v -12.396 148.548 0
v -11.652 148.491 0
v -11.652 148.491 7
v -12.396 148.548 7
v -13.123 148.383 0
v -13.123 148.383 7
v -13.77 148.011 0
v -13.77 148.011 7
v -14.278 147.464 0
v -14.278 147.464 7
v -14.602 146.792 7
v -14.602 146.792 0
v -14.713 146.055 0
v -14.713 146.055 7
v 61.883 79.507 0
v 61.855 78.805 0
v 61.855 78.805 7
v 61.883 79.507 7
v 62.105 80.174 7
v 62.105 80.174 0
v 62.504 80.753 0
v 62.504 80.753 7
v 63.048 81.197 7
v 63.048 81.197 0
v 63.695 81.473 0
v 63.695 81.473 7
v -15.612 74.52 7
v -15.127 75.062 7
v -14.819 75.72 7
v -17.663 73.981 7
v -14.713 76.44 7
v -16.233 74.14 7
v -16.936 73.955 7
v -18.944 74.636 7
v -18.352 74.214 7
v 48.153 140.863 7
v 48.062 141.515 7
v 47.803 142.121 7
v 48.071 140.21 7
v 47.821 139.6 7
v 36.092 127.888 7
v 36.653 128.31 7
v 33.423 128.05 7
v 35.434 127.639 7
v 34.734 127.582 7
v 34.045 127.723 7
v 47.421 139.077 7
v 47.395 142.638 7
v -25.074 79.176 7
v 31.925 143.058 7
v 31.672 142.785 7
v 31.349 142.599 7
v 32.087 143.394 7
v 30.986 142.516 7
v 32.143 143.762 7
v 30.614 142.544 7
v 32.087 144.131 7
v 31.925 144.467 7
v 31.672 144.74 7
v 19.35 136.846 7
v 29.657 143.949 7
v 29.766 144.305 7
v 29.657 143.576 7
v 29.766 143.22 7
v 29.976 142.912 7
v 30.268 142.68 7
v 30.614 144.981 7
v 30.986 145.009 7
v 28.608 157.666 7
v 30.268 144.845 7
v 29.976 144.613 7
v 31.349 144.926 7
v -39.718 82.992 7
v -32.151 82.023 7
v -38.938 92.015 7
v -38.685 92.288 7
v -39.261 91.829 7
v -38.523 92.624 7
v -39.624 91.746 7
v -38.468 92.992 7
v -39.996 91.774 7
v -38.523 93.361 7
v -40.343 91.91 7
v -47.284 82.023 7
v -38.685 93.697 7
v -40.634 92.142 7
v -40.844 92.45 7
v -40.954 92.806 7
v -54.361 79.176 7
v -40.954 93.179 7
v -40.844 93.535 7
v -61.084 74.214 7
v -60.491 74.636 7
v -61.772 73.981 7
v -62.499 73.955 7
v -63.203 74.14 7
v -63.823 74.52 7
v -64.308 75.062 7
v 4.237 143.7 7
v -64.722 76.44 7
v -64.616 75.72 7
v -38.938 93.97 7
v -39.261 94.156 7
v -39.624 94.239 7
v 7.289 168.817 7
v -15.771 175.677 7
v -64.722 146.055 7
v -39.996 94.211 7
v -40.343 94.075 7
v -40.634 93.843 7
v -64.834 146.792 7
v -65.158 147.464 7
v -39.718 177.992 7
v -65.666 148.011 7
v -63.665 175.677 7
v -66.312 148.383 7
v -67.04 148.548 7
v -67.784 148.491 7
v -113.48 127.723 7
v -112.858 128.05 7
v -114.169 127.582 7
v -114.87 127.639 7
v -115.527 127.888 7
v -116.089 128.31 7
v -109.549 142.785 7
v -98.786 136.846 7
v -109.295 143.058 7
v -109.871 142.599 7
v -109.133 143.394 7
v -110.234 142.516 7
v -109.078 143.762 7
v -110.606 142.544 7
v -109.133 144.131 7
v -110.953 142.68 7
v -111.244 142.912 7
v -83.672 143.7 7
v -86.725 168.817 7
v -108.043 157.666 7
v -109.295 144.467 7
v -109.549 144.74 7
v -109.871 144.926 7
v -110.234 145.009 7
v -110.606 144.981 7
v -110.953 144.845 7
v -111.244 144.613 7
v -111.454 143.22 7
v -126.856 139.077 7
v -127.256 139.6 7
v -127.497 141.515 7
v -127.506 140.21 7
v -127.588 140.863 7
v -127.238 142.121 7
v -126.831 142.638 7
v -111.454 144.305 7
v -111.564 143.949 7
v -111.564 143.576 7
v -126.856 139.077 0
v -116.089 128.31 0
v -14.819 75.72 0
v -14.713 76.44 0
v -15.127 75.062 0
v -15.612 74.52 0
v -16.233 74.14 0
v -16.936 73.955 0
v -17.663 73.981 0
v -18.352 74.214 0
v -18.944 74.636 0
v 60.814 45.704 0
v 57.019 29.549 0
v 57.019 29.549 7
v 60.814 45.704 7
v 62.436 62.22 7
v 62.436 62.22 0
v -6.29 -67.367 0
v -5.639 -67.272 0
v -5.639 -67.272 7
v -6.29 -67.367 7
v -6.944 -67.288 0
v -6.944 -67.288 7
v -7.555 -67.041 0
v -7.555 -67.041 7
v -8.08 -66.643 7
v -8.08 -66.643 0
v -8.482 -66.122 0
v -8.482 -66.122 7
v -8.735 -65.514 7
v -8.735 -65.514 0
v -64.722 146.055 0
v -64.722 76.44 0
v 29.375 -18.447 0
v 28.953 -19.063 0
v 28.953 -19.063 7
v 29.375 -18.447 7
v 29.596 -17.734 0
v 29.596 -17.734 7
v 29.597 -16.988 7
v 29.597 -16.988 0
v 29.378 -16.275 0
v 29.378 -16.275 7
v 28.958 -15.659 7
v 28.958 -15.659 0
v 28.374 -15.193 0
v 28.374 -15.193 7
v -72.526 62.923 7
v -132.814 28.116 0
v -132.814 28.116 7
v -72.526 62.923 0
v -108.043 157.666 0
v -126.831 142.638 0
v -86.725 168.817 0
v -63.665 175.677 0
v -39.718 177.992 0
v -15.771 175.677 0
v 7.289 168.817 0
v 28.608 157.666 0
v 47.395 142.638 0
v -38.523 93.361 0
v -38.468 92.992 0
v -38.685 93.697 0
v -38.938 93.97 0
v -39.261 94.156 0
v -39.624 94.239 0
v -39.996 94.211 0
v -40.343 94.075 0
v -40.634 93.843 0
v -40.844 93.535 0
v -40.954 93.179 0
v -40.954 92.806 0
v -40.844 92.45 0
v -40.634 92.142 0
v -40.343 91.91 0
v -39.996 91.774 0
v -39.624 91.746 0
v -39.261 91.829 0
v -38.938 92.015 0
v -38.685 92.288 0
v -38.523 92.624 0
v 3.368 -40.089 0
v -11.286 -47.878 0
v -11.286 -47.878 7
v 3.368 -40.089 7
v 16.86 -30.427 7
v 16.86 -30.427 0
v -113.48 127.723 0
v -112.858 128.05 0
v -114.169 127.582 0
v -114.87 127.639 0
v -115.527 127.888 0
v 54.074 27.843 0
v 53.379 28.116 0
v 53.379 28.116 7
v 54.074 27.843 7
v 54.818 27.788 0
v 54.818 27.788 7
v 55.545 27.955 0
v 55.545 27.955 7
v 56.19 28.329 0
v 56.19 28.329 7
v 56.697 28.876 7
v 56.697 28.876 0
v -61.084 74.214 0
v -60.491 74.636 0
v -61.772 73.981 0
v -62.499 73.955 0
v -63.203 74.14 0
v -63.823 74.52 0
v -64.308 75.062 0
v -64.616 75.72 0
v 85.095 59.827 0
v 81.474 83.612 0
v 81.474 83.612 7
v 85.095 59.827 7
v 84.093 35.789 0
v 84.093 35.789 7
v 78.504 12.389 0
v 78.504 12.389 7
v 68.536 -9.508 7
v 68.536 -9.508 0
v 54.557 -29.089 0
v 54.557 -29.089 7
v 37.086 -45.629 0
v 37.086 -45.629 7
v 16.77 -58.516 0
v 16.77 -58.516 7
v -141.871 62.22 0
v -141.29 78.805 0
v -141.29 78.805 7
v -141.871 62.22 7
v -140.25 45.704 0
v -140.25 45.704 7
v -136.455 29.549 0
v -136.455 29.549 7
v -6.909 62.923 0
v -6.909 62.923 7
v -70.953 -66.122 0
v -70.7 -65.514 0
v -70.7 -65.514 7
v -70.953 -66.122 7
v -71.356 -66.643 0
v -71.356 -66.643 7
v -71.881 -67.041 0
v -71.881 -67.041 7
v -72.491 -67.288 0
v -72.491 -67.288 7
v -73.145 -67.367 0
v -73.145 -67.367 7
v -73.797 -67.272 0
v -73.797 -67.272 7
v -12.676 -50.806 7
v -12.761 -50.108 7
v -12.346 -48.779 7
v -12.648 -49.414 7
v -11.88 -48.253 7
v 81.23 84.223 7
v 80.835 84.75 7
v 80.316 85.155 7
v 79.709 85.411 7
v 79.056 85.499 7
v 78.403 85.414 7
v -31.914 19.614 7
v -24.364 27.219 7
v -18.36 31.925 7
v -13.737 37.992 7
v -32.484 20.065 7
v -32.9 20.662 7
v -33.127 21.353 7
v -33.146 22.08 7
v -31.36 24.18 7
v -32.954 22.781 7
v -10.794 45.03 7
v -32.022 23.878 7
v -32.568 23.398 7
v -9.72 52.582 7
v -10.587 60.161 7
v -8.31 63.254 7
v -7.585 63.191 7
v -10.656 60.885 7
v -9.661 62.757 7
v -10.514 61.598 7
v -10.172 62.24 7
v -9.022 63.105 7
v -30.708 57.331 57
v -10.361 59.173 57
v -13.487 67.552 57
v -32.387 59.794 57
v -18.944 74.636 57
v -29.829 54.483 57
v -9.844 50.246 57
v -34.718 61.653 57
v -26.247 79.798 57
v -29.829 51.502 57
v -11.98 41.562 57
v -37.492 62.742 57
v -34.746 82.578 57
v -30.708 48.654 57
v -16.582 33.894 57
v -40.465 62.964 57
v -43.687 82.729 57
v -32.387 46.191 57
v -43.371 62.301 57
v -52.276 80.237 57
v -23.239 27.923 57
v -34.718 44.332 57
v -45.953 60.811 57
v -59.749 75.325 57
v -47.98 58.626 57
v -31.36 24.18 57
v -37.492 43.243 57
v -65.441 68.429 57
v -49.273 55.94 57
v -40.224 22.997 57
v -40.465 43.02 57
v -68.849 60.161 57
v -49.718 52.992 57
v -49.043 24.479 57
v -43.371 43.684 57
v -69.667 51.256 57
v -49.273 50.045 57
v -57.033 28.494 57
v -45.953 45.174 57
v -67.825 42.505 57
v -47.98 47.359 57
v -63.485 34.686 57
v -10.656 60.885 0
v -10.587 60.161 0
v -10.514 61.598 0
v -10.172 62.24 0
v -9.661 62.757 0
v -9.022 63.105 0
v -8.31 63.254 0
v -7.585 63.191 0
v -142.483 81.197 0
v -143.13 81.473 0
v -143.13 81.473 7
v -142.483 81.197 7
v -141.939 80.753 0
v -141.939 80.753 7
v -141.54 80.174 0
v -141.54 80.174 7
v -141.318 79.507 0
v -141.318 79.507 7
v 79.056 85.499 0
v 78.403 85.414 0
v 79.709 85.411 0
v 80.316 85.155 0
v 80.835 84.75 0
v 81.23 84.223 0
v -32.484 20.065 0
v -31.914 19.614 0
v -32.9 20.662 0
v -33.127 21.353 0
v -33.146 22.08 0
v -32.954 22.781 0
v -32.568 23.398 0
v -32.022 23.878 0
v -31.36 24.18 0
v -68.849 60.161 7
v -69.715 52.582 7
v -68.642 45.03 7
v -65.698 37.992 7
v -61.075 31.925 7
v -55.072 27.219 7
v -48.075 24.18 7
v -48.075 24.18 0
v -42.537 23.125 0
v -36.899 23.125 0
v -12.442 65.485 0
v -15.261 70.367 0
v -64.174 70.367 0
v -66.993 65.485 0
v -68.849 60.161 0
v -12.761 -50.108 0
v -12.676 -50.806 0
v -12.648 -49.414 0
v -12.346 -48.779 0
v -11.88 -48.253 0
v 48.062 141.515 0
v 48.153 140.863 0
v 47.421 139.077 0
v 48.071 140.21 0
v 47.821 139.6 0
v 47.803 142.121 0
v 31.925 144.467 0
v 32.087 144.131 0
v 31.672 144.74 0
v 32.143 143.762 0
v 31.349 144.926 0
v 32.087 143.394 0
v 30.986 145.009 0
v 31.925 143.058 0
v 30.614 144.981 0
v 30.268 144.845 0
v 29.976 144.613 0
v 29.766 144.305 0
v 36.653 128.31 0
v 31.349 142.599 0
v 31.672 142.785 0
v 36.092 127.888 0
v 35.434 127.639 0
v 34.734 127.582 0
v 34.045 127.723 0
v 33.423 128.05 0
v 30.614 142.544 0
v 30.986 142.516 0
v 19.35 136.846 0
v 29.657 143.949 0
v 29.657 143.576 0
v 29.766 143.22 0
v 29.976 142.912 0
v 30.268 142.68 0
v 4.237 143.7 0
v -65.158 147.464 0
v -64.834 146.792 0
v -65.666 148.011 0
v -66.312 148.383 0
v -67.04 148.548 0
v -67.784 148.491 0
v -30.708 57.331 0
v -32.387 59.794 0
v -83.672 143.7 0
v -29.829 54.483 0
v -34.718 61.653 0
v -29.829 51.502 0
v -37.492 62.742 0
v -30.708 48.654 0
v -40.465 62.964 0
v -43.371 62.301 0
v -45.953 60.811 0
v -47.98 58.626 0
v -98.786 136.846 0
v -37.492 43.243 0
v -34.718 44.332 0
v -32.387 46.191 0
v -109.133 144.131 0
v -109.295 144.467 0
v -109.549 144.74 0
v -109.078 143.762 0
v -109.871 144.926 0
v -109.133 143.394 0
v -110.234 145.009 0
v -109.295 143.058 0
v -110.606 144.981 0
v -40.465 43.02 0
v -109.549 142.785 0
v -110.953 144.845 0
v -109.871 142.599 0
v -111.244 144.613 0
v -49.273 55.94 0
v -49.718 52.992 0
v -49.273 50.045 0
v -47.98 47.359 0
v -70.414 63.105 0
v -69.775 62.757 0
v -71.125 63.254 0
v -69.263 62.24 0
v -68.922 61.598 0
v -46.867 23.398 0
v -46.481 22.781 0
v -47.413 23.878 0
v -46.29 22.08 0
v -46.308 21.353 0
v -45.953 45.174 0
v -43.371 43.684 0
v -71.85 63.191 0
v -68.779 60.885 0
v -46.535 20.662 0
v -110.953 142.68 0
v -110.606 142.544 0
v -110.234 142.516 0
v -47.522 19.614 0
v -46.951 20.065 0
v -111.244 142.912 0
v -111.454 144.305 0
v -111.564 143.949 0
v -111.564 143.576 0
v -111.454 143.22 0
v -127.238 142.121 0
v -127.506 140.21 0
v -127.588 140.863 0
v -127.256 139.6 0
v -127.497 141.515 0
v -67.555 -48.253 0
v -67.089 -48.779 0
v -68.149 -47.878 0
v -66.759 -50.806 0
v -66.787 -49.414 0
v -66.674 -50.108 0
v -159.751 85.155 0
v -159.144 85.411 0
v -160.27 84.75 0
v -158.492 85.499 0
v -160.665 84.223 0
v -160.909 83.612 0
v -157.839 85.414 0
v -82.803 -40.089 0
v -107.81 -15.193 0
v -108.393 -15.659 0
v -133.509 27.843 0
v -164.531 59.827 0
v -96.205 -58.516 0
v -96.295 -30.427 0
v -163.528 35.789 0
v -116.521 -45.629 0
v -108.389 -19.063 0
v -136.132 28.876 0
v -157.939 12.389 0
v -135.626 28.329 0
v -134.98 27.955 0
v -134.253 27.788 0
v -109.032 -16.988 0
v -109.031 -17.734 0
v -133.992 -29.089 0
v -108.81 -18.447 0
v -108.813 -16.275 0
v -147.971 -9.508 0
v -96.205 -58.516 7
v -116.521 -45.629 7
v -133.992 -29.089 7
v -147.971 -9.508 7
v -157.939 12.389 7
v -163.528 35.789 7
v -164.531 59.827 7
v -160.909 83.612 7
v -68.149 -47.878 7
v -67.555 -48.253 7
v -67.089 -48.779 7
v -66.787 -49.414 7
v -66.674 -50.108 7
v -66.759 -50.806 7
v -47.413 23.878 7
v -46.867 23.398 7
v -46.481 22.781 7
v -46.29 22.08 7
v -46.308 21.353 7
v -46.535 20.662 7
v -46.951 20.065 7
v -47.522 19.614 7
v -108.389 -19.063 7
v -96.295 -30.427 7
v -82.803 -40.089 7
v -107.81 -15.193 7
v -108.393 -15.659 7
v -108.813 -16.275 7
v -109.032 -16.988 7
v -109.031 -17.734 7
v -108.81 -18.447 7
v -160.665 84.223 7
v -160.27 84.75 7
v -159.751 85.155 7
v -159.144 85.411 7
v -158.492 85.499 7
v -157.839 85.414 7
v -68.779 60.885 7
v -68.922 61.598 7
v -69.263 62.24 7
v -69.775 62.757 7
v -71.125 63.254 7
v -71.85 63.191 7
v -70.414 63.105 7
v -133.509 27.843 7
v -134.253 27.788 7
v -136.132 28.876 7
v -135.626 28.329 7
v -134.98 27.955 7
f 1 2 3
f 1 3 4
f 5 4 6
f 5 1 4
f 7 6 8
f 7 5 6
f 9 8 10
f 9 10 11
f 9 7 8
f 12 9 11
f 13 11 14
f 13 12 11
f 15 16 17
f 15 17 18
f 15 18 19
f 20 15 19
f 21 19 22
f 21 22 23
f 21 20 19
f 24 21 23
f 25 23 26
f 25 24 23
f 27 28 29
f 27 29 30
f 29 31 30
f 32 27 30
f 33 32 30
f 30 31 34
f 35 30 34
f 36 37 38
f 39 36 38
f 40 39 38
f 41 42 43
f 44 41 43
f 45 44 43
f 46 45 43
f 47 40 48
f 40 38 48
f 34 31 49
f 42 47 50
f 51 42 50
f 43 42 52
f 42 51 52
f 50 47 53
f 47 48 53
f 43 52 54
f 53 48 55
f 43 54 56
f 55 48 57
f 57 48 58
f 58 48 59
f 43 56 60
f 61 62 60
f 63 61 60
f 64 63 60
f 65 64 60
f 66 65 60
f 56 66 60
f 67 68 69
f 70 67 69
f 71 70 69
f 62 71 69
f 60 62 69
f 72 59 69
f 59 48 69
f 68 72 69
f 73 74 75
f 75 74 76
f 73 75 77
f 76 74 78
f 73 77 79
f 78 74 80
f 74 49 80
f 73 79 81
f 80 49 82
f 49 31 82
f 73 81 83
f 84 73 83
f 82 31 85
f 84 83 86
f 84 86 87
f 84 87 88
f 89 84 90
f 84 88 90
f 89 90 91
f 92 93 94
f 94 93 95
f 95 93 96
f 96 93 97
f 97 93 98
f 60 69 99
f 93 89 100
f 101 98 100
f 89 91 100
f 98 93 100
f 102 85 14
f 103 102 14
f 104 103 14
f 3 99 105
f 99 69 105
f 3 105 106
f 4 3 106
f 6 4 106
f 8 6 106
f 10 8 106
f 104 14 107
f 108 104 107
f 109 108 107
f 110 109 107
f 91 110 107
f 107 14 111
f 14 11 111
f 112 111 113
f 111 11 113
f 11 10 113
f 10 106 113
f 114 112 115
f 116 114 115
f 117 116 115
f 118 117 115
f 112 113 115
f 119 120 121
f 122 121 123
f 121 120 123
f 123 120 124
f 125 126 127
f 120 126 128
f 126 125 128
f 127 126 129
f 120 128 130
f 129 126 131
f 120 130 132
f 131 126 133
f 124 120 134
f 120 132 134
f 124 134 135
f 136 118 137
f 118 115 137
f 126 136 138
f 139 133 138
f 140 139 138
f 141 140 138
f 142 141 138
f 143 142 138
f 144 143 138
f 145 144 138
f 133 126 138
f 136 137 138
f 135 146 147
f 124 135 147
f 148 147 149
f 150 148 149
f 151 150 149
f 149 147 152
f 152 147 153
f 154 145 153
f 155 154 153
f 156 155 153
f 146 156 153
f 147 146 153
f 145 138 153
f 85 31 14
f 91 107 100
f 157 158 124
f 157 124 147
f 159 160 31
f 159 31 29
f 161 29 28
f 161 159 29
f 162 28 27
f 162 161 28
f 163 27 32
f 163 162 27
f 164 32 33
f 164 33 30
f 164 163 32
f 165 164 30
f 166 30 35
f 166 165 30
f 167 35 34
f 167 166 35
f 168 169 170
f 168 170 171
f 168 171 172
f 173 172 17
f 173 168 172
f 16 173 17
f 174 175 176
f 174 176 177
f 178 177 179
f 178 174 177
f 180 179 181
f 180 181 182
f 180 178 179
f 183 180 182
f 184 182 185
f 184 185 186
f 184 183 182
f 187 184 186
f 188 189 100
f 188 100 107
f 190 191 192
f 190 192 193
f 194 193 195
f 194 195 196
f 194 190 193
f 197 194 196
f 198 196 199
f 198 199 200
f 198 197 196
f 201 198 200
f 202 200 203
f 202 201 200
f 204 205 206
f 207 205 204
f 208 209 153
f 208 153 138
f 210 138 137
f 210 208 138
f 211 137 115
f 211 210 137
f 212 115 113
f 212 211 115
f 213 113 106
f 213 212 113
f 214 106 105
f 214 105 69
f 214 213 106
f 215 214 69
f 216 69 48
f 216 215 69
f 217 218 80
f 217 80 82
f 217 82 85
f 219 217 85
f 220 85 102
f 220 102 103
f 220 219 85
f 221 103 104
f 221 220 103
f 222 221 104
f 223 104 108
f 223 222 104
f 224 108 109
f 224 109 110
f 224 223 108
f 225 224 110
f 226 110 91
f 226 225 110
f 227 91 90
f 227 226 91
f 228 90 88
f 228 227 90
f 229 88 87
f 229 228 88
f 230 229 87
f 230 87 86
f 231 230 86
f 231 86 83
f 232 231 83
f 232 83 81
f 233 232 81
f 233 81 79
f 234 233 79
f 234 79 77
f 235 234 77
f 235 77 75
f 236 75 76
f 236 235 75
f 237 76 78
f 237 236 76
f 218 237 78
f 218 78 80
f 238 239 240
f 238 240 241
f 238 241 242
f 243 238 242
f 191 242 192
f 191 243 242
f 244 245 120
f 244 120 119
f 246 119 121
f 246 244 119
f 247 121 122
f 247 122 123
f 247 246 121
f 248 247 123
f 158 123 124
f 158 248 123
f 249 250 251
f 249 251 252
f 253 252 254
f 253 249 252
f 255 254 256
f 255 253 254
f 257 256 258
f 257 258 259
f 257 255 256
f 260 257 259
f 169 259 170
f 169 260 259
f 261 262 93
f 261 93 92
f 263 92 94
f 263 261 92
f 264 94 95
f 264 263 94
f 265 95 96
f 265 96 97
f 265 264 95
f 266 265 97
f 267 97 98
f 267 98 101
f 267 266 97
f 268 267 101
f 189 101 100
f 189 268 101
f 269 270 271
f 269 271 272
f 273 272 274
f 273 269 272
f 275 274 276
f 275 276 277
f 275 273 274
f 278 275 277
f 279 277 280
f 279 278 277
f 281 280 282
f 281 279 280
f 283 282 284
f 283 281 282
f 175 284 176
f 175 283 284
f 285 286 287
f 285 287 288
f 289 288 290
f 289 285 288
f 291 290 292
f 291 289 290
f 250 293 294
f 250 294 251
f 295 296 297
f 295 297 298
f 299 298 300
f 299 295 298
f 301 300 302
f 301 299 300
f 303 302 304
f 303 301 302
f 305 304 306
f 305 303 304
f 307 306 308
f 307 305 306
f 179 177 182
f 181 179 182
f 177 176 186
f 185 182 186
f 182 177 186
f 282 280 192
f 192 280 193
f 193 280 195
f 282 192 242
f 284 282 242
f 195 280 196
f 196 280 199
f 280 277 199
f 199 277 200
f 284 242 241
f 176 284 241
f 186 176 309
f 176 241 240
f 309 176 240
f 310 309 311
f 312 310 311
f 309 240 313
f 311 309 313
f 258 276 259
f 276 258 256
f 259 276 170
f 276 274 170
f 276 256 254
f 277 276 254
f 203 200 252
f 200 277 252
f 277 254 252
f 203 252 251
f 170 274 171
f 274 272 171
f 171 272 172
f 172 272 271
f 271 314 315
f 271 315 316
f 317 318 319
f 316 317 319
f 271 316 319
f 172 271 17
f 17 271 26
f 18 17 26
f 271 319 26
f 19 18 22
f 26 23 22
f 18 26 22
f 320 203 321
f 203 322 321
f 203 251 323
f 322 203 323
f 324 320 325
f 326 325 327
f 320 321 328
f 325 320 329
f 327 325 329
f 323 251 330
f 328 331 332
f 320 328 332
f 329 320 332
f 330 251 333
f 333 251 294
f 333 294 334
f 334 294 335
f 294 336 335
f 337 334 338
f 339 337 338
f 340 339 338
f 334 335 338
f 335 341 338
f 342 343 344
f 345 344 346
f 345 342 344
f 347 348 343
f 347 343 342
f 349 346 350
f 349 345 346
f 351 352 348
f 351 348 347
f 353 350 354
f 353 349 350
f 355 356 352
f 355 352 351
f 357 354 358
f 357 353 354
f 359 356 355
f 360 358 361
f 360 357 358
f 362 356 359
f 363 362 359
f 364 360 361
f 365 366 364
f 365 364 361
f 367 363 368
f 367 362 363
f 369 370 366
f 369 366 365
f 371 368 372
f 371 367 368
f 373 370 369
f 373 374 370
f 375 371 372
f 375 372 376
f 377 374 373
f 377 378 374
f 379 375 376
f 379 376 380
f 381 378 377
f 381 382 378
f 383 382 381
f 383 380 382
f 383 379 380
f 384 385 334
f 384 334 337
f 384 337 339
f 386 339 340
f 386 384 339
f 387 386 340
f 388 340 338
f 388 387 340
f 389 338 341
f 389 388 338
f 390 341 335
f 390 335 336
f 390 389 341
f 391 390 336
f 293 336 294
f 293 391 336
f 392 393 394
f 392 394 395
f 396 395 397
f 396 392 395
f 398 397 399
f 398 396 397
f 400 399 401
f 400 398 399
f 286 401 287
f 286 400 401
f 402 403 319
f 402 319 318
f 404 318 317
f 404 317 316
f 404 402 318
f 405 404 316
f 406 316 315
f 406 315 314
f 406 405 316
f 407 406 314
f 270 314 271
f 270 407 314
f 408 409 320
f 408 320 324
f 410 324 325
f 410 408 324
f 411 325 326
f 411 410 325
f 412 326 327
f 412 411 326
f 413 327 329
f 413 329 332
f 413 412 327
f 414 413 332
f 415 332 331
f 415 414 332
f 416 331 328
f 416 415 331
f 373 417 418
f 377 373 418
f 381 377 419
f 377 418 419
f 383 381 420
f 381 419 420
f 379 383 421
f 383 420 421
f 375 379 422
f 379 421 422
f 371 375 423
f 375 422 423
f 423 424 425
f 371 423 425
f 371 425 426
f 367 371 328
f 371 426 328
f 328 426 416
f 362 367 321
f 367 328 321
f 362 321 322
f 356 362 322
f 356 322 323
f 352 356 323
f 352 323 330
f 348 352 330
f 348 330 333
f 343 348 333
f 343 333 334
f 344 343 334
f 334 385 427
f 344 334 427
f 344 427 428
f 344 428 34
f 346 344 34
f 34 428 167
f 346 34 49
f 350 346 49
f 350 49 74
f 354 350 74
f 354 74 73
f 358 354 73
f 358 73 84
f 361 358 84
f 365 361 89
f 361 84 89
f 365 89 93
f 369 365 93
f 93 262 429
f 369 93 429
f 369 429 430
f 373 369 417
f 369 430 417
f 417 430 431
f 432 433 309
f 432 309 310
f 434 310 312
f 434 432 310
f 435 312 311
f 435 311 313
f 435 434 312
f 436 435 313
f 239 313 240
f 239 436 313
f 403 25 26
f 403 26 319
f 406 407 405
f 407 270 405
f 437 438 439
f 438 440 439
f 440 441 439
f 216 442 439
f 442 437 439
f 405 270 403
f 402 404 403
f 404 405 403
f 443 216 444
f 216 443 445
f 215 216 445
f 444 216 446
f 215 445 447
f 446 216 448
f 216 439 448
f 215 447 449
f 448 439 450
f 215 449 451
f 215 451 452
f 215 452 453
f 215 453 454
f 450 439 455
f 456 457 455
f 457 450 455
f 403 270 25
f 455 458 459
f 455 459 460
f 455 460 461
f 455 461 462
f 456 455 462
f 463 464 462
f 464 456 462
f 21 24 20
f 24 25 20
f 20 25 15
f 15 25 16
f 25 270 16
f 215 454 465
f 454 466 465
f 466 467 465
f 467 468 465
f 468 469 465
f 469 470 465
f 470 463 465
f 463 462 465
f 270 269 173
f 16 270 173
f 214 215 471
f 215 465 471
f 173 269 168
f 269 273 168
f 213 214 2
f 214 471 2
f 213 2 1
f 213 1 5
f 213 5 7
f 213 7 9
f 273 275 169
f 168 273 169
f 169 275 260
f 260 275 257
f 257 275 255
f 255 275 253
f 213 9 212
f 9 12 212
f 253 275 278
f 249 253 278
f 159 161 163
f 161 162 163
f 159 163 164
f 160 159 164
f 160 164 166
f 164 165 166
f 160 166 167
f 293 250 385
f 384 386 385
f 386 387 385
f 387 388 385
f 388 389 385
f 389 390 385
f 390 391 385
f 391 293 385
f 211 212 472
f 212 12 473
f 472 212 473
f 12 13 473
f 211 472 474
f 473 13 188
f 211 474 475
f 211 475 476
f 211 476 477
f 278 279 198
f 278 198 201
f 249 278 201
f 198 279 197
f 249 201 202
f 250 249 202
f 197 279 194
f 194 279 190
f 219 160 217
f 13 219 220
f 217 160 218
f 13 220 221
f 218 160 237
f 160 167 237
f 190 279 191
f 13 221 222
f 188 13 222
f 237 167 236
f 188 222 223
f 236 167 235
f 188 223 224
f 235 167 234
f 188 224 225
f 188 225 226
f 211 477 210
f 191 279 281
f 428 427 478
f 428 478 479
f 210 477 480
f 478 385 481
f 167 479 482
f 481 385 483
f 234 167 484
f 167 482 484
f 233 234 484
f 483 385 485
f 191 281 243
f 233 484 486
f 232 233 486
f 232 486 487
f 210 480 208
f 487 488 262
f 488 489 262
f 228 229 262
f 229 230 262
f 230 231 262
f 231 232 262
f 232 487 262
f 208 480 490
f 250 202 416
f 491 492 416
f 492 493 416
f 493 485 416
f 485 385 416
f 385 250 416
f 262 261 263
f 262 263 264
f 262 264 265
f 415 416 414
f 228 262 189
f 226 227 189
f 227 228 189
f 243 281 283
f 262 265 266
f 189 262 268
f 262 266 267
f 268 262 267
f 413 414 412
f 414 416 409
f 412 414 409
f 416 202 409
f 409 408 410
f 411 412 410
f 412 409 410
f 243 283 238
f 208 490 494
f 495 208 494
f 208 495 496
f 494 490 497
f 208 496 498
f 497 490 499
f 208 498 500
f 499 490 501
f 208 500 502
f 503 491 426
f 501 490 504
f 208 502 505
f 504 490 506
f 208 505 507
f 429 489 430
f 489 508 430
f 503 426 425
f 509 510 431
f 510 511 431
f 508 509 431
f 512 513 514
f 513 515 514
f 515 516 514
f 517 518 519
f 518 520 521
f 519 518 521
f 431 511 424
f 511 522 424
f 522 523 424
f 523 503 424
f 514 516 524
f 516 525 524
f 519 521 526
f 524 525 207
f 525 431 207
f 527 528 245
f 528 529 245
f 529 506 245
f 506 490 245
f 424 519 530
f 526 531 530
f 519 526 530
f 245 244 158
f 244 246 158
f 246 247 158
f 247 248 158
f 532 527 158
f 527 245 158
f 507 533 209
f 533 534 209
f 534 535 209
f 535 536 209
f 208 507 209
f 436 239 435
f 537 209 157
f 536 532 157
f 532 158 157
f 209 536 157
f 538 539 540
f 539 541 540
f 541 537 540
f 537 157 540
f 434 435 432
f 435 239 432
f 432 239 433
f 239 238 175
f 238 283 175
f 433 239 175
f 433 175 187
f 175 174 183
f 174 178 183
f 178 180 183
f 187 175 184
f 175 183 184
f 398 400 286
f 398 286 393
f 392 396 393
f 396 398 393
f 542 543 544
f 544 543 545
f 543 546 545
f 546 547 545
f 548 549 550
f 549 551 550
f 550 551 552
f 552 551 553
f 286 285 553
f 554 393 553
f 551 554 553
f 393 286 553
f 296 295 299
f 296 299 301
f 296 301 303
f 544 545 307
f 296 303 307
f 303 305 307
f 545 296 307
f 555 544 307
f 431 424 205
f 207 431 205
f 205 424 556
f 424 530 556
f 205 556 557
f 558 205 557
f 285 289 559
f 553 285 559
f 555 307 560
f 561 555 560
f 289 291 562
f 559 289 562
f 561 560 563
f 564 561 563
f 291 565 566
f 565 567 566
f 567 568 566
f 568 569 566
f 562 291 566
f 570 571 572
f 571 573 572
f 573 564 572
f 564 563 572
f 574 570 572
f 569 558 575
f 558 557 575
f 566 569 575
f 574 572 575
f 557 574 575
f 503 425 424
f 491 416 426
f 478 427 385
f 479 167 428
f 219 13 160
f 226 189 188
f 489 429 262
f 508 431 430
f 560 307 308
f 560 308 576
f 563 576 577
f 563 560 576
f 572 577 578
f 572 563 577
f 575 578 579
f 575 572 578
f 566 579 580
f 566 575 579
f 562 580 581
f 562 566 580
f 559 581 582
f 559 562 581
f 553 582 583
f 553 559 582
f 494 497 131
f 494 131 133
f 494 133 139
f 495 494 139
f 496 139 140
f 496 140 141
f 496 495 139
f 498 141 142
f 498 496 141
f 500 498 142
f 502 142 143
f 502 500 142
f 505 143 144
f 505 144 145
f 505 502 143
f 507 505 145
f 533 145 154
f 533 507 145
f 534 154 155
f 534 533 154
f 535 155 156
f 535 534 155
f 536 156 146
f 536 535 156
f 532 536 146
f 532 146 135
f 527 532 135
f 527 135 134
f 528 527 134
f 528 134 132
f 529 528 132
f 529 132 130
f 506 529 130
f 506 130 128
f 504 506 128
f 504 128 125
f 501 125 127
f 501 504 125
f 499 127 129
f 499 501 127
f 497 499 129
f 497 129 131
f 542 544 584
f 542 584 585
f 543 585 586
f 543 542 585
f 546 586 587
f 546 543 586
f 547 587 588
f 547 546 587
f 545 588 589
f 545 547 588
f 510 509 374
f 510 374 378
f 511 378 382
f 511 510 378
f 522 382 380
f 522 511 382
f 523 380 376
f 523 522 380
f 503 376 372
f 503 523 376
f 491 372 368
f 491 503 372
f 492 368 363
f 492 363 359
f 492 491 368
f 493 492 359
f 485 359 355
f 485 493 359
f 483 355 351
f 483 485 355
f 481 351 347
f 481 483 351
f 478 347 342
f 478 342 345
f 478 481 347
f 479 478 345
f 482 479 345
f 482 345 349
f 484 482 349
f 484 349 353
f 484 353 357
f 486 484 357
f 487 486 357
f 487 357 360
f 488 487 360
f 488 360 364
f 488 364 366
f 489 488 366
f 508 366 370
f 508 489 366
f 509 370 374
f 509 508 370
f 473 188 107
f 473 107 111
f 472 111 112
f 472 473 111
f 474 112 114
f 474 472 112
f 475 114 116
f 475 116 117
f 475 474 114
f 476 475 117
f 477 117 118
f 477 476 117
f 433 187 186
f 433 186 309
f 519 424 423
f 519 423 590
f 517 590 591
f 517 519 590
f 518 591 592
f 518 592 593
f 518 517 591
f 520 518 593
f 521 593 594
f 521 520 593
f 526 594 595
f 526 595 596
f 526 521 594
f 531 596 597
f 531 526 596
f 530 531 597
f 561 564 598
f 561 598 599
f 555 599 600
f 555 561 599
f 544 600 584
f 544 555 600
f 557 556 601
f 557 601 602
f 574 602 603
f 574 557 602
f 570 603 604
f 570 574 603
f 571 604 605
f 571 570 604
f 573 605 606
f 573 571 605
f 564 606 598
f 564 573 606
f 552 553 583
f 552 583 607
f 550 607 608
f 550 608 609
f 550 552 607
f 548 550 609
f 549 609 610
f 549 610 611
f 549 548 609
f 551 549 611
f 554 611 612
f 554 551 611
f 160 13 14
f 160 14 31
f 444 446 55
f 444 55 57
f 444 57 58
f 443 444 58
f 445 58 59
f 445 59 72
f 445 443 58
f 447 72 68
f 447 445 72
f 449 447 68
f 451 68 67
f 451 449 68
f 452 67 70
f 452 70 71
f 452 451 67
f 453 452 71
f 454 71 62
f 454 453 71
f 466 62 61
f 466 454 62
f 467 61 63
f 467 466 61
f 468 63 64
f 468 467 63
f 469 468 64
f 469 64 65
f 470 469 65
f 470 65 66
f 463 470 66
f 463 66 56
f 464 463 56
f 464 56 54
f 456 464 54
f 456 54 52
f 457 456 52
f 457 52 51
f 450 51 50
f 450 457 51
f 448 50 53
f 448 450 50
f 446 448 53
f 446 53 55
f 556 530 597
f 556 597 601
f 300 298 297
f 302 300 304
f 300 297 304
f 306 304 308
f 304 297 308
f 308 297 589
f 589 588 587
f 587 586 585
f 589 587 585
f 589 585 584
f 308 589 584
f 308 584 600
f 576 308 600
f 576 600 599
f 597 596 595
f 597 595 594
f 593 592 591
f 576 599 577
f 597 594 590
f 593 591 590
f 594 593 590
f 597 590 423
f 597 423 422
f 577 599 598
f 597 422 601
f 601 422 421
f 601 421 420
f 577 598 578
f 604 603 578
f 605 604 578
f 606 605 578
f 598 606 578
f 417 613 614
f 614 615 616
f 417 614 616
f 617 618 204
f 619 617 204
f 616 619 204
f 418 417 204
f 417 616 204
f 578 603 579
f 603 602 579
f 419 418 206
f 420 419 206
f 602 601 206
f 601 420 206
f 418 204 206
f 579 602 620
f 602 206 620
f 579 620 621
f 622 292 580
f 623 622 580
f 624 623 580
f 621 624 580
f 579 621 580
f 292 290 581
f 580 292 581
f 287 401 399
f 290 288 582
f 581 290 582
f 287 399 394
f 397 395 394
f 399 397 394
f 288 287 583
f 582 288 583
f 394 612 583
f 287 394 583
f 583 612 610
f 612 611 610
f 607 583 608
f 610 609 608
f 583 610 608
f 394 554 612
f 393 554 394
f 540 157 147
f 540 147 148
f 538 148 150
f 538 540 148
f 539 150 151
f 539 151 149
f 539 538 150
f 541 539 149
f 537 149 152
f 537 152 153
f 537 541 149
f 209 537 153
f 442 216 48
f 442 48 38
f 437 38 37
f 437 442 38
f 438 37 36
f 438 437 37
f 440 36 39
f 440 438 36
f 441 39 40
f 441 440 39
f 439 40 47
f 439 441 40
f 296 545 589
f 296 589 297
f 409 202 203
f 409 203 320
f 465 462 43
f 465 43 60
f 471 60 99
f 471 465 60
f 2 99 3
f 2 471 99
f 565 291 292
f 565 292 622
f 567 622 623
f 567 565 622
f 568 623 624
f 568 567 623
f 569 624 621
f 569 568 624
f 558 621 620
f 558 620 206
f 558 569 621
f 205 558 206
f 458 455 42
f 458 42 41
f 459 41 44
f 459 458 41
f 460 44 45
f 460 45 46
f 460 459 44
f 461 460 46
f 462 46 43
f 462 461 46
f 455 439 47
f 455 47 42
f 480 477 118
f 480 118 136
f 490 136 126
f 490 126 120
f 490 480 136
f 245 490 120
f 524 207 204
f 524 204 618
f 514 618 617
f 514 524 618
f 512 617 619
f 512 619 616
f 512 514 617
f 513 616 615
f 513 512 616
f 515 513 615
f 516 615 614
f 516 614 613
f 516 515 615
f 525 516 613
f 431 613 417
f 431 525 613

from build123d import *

# Parameters (mm, degrees)
SKETCH1_R             = 1.25
BOSS_EXTRUDE1_DEPTH   = 7
BOSS_EXTRUDE2_DEPTH   = 7
BOSS_EXTRUDE2_2_DEPTH = 7
SKETCH1_7_R           = 10
BOSS_EXTRUDE3_DEPTH   = 57


with BuildPart() as part:
    # Sketch1 → Boss-Extrude1 (new body)
    with BuildSketch(Plane.XY):
        with BuildLine():
            ThreePointArc((-60.491152811, 74.636373352), (-39.71763232, 82.992417004), (-18.944111829, 74.636373352))
            ThreePointArc((-18.944111829, 74.636373352), (-16.23263232, 74.140273701), (-14.712985122, 76.440036381))
            Line((-14.712985122, 76.440036381), (-14.712985122, 146.054710198))
            ThreePointArc((-14.712985122, 146.054710198), (-13.769696668, 148.010892491), (-11.651665791, 148.490879447))
            ThreePointArc((-11.651665791, 148.490879447), (11.907367753, 140.523795103), (33.422869053, 128.050395473))
            ThreePointArc((33.422869053, 128.050395473), (35.085920842, 127.585787298), (36.653446033, 128.309988089))
            Line((36.653446033, 128.309988089), (47.420811552, 139.077353608))
            ThreePointArc((47.420811552, 139.077353608), (48.15298045, 140.863029774), (47.395303312, 142.638032879))
            ThreePointArc((47.395303312, 142.638032879), (-39.71763232, 177.992417004), (-126.830567952, 142.638032879))
            ThreePointArc((-126.830567952, 142.638032879), (-127.588245091, 140.863029774), (-126.856076193, 139.077353608))
            Line((-126.856076193, 139.077353608), (-116.088710674, 128.309988089))
            ThreePointArc((-116.088710674, 128.309988089), (-114.521185483, 127.585787298), (-112.858133693, 128.050395473))
            ThreePointArc((-112.858133693, 128.050395473), (-91.342632394, 140.523795103), (-67.783598849, 148.490879447))
            ThreePointArc((-67.783598849, 148.490879447), (-65.665567973, 148.010892491), (-64.722279519, 146.054710198))
            Line((-64.722279519, 146.054710198), (-64.722279519, 76.440036381))
            ThreePointArc((-64.722279519, 76.440036381), (-63.20263232, 74.140273701), (-60.491152811, 74.636373352))
        make_face()
        with Locations((-39.71763232, 92.992417004)):
            Circle(SKETCH1_R, mode=Mode.SUBTRACT)
        with Locations((-110.327911654, 143.762392505)):
            Circle(SKETCH1_R, mode=Mode.SUBTRACT)
        with Locations((30.892647013, 143.762392505)):
            Circle(SKETCH1_R, mode=Mode.SUBTRACT)
    extrude(amount=BOSS_EXTRUDE1_DEPTH)



with BuildPart() as body_2:
    # Sketch1<5> → Boss-Extrude2 (new body)
    with BuildSketch(Plane.XY):
        with BuildLine():
            Line((-31.91372188, 19.613947629), (28.374354121, -15.19338928))
            ThreePointArc((28.374354121, -15.19338928), (29.596813454, -16.988392191), (28.953478913, -19.062654214))
            ThreePointArc((28.953478913, -19.062654214), (10.274264705, -35.481833579), (-11.285766896, -47.878104465))
            ThreePointArc((-11.285766896, -47.878104465), (-12.519655272, -49.086045475), (-12.676241586, -50.805662507))
            Line((-12.676241586, -50.805662507), (-8.735112274, -65.514157338))
            ThreePointArc((-8.735112274, -65.514157338), (-7.5547558, -67.041072287), (-5.638719451, -67.272406189))
            ThreePointArc((-5.638719451, -67.272406189), (68.535543153, -9.507582996), (81.474216181, 83.611624322))
            ThreePointArc((81.474216181, 83.611624322), (80.31585697, 85.155293524), (78.403331598, 85.414054741))
            Line((78.403331598, 85.414054741), (63.694836768, 81.47292543))
            ThreePointArc((63.694836768, 81.47292543), (62.28389789, 80.477509189), (61.854734477, 78.804960004))
            ThreePointArc((61.854734477, 78.804960004), (61.899264778, 53.935289488), (57.019445442, 29.549025778))
            ThreePointArc((57.019445442, 29.549025778), (55.544749107, 27.954750711), (53.37900132, 28.115930093))
            Line((53.37900132, 28.115930093), (-6.909074682, 62.923267002))
            ThreePointArc((-6.909074682, 62.923267002), (-9.660551185, 62.757095263), (-10.586656039, 60.160835301))
            ThreePointArc((-10.586656039, 60.160835301), (-13.736870207, 37.992417004), (-31.360176529, 24.180042358))
            ThreePointArc((-31.360176529, 24.180042358), (-33.145551185, 22.079882047), (-31.91372188, 19.613947629))
        make_face()
    extrude(amount=BOSS_EXTRUDE2_DEPTH)


with BuildPart() as body_3:
    # Sketch1<5> → Boss-Extrude2 2 (new body)
    with BuildSketch(Plane.XY):
        with BuildLine():
            ThreePointArc((-47.52154276, 19.613947629), (-46.289713456, 22.079882047), (-48.075088111, 24.180042358))
            ThreePointArc((-48.075088111, 24.180042358), (-65.698394434, 37.992417004), (-68.848608602, 60.160835301))
            ThreePointArc((-68.848608602, 60.160835301), (-69.774713456, 62.757095263), (-72.526189959, 62.923267002))
            Line((-72.526189959, 62.923267002), (-132.81426596, 28.115930093))
            ThreePointArc((-132.81426596, 28.115930093), (-134.980013747, 27.954750711), (-136.454710083, 29.549025778))
            ThreePointArc((-136.454710083, 29.549025778), (-141.334529419, 53.935289488), (-141.289999118, 78.804960004))
            ThreePointArc((-141.289999118, 78.804960004), (-141.71916253, 80.477509189), (-143.130101408, 81.47292543))
            Line((-143.130101408, 81.47292543), (-157.838596239, 85.414054741))
            ThreePointArc((-157.838596239, 85.414054741), (-159.751121611, 85.155293524), (-160.909480822, 83.611624322))
            ThreePointArc((-160.909480822, 83.611624322), (-147.970807793, -9.507582996), (-73.79654519, -67.272406189))
            ThreePointArc((-73.79654519, -67.272406189), (-71.88050884, -67.041072287), (-70.700152367, -65.514157338))
            Line((-70.700152367, -65.514157338), (-66.759023055, -50.805662507))
            ThreePointArc((-66.759023055, -50.805662507), (-66.915609368, -49.086045475), (-68.149497745, -47.878104465))
            ThreePointArc((-68.149497745, -47.878104465), (-89.709529345, -35.481833579), (-108.388743554, -19.062654214))
            ThreePointArc((-108.388743554, -19.062654214), (-109.032078095, -16.988392191), (-107.809618762, -15.19338928))
            Line((-107.809618762, -15.19338928), (-47.52154276, 19.613947629))
        make_face()
    extrude(amount=BOSS_EXTRUDE2_2_DEPTH)


with BuildPart() as part_1:
    add(part.part)

    add(body_2.part)  # Boss-Extrude3 merges body 2

    add(body_3.part)  # Boss-Extrude3 merges body 3
    # Sketch1<7> → Boss-Extrude3 (add)
    with BuildSketch(Plane.XY):
        with BuildLine():
            ThreePointArc((-48.075088111, 24.180042358), (-39.71763232, 22.992417004), (-31.360176529, 24.180042358))
            ThreePointArc((-31.360176529, 24.180042358), (-15.73093107, 34.97469897), (-9.71763232, 52.992417004))
            ThreePointArc((-9.71763232, 52.992417004), (-9.935680668, 56.602867914), (-10.586656039, 60.160835301))
            ThreePointArc((-10.586656039, 60.160835301), (-13.736870207, 67.992417004), (-18.944111829, 74.636373352))
            ThreePointArc((-18.944111829, 74.636373352), (-39.71763232, 82.992417004), (-60.491152811, 74.636373352))
            ThreePointArc((-60.491152811, 74.636373352), (-65.698394434, 67.992417004), (-68.848608602, 60.160835301))
            ThreePointArc((-68.848608602, 60.160835301), (-65.698394434, 37.992417004), (-48.075088111, 24.180042358))
        make_face()
        with Locations((-39.71763232, 52.992417004)):
            Circle(SKETCH1_7_R, mode=Mode.SUBTRACT)
    extrude(amount=BOSS_EXTRUDE3_DEPTH)


solid = part_1.part
